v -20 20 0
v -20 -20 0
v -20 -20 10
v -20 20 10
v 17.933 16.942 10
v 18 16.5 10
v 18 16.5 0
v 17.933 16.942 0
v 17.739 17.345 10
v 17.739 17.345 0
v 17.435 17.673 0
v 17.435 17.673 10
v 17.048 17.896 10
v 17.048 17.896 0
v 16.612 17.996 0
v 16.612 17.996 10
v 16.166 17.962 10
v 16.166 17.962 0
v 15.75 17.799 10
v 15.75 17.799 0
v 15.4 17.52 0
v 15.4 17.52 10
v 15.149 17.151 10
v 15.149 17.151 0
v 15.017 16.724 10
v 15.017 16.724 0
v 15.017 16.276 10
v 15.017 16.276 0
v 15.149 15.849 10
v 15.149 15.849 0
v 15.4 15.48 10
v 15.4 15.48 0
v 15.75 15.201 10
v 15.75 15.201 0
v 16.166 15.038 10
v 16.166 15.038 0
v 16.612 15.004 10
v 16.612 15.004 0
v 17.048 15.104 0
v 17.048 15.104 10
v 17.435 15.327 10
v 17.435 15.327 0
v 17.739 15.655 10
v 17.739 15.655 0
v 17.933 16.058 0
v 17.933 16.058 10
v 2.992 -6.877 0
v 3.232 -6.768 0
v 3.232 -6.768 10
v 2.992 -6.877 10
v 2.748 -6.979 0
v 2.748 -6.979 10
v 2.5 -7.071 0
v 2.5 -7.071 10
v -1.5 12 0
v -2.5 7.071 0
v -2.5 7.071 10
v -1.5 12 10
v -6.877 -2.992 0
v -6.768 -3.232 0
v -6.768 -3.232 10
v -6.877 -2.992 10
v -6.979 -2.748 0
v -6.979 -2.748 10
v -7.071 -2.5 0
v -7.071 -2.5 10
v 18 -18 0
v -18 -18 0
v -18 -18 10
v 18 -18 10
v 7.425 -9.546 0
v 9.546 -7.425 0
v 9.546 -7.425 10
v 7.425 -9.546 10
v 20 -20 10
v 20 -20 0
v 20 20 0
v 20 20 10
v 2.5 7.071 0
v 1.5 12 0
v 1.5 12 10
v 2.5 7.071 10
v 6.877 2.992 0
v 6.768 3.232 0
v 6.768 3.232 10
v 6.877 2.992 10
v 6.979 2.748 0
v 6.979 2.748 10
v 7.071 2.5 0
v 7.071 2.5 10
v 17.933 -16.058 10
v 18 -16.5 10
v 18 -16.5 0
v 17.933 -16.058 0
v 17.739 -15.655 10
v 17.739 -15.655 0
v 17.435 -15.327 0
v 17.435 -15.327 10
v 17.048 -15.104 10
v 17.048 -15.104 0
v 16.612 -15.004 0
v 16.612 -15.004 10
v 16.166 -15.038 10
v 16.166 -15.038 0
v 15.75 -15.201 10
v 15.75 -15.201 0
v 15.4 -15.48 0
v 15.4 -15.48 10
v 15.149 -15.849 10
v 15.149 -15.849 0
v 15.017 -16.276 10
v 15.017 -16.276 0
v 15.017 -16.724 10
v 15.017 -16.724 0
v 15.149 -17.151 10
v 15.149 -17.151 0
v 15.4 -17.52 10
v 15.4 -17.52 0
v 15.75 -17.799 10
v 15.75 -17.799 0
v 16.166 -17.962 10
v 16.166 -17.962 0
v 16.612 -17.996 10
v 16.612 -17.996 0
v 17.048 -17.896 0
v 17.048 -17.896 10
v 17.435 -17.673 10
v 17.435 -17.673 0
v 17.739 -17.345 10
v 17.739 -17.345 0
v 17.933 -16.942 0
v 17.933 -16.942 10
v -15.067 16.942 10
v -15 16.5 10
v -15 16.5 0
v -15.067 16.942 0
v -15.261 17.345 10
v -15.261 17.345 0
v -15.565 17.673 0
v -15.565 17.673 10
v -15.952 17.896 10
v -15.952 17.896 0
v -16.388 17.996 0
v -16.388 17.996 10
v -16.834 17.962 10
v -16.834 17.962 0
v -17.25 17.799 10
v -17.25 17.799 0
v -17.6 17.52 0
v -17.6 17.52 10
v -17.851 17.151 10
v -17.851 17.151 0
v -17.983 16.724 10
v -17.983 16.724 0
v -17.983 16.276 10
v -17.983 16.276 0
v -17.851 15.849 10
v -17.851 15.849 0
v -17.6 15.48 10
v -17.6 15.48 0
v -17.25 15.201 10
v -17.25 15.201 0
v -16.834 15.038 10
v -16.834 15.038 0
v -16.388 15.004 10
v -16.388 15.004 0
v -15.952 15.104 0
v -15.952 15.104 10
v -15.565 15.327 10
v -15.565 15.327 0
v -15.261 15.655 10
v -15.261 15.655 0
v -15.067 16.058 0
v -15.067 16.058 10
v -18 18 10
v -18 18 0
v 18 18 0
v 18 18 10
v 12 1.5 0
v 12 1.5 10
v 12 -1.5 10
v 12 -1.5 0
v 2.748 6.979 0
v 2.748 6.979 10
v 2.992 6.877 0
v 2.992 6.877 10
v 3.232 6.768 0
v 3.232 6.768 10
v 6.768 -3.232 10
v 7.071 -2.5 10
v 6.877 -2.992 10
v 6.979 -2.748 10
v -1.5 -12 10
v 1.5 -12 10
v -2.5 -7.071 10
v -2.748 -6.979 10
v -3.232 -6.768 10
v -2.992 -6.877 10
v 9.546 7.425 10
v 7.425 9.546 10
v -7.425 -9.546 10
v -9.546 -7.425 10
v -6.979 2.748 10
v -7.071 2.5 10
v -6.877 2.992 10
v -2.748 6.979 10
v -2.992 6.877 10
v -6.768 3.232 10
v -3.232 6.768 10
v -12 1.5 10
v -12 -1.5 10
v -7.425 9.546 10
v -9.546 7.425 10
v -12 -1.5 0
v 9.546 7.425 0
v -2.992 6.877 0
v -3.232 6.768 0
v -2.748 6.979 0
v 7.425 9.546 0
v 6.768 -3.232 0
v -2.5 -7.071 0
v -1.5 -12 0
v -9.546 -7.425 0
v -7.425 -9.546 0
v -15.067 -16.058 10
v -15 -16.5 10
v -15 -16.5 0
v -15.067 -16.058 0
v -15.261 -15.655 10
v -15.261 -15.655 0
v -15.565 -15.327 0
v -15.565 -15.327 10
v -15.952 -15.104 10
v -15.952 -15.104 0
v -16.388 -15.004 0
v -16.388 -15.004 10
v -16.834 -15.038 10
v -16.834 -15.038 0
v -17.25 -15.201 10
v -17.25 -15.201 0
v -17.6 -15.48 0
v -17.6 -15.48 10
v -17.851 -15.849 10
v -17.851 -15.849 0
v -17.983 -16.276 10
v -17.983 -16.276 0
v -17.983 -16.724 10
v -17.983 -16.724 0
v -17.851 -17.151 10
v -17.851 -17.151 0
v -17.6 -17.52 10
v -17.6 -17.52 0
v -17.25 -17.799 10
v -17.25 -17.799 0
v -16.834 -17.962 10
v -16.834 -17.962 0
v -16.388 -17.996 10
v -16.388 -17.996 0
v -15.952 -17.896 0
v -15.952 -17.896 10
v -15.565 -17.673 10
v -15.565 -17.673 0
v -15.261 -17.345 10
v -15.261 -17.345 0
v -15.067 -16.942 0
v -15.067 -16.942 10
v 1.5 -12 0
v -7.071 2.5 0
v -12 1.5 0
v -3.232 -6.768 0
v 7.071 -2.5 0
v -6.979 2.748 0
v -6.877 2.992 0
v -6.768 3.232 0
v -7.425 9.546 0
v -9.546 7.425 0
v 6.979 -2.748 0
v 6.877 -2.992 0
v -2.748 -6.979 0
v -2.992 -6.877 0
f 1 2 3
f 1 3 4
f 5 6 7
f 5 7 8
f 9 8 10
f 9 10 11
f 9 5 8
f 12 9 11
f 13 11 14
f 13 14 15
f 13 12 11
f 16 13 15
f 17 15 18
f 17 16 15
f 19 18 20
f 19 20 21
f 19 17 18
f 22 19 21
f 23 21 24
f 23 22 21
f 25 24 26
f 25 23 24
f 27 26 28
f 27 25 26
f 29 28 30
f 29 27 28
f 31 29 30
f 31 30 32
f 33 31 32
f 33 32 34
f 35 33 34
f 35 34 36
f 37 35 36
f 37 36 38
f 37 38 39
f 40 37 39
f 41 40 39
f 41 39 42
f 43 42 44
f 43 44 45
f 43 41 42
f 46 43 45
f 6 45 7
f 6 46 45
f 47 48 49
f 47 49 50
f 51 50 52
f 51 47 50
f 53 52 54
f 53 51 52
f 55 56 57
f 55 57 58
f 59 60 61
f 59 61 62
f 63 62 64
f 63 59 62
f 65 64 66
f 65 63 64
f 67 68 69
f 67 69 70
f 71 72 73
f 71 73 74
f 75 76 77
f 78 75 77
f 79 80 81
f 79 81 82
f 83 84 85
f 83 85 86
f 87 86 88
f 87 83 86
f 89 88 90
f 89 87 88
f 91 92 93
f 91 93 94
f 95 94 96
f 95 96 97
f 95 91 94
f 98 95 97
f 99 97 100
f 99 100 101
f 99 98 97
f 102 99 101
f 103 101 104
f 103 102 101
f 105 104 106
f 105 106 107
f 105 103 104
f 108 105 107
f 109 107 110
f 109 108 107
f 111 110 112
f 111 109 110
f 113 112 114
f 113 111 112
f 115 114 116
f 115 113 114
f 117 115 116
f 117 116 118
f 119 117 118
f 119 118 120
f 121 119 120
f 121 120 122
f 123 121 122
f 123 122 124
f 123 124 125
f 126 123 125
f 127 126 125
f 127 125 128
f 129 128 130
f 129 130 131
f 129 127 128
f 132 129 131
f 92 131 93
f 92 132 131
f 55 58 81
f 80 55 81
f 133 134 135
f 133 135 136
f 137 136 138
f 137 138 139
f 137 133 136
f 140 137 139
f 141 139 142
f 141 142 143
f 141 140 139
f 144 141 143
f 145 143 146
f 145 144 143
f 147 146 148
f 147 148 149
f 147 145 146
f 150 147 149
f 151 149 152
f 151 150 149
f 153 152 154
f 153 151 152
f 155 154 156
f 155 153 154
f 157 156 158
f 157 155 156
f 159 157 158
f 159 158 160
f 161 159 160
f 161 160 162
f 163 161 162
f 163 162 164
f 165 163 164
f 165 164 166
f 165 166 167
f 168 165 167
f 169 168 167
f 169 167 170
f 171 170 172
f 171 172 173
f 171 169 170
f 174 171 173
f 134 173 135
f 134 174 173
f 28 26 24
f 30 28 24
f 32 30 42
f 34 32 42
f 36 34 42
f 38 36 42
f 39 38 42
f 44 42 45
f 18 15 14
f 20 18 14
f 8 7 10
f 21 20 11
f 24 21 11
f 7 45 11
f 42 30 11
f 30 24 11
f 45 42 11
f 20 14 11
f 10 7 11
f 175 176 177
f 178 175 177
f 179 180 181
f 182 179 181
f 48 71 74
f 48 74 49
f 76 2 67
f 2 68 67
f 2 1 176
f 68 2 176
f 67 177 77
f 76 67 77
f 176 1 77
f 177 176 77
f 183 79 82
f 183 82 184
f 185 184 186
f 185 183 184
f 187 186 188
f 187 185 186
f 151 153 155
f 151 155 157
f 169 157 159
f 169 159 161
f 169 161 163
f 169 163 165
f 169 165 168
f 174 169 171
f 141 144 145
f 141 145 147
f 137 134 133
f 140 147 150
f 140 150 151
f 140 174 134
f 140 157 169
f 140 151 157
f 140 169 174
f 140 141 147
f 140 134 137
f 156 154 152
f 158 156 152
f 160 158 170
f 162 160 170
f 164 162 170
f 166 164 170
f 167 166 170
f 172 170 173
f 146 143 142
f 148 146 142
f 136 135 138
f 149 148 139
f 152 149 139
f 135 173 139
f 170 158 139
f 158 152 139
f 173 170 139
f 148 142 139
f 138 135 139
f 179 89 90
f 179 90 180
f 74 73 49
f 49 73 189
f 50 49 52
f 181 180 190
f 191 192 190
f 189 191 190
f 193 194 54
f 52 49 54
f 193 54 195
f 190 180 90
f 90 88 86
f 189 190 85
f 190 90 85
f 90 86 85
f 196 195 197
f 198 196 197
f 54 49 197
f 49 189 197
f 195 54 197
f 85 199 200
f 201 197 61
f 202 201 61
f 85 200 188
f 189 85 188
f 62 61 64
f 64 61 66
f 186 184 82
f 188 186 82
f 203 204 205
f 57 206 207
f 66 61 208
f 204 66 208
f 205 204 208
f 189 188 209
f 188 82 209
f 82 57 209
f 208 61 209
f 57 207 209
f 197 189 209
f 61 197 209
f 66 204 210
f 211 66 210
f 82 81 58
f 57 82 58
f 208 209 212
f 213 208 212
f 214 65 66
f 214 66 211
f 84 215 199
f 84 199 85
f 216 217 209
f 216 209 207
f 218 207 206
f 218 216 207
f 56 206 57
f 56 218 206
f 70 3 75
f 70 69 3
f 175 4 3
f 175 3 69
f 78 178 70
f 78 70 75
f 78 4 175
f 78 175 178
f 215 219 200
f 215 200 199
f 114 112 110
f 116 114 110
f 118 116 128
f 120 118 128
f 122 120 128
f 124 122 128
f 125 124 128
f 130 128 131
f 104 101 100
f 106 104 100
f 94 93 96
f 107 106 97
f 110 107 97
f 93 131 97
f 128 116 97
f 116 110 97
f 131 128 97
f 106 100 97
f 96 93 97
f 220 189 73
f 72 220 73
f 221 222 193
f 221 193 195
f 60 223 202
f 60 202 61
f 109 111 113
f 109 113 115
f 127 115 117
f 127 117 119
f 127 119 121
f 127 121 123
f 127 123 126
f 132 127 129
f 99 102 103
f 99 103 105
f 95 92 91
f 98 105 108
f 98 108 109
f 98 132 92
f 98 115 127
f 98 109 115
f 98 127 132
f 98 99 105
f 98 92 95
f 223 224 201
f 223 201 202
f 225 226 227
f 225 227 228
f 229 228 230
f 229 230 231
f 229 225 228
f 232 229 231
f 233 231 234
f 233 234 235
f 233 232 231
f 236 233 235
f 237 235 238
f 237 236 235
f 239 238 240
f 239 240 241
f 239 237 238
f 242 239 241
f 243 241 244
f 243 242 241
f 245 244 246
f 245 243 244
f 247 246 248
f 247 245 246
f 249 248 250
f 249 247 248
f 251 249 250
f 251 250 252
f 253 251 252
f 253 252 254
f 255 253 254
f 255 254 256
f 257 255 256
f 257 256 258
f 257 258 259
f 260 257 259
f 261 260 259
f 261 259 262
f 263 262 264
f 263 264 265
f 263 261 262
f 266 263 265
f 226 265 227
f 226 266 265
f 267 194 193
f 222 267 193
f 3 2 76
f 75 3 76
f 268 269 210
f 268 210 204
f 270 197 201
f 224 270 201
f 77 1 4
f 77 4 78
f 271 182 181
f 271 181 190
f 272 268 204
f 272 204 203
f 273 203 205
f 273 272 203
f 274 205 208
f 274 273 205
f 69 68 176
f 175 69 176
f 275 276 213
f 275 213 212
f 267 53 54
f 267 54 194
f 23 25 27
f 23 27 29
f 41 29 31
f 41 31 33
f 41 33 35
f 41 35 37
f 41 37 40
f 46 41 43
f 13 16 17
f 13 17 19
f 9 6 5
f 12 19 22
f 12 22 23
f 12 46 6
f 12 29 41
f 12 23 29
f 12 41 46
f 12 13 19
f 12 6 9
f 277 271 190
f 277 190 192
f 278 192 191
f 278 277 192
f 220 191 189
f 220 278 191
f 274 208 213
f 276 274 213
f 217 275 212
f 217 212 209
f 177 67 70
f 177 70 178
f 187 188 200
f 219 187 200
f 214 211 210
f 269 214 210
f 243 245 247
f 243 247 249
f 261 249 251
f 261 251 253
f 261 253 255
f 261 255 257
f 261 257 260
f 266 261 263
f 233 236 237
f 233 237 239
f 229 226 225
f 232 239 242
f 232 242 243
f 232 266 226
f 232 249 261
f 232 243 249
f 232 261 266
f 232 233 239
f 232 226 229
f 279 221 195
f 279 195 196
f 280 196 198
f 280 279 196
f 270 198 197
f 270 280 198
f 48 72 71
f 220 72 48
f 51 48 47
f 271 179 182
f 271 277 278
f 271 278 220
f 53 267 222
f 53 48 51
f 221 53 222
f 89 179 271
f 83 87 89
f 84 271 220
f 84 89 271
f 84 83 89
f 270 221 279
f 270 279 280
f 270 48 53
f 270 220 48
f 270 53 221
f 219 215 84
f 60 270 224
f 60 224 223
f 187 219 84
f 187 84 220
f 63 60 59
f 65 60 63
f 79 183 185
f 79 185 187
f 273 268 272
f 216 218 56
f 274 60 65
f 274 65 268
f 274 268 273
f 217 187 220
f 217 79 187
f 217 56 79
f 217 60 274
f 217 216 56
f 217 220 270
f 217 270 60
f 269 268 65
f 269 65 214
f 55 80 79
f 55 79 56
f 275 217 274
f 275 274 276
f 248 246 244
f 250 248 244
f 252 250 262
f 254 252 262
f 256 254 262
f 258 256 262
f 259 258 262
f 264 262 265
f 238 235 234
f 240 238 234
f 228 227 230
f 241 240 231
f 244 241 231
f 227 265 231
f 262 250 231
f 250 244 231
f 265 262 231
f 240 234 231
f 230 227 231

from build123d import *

# Parameters (mm, degrees)
BOSS_EXTRUDE1_DEPTH   = 10
SKETCH1_W             = 40
SKETCH1_H             = 40
SKETCH1_W_2           = 36
SKETCH1_H_2           = 36
BOSS_EXTRUDE1_2_DEPTH = 10
SKETCH2_R             = 1.5
BOSS_EXTRUDE2_DEPTH   = 10
BOSS_EXTRUDE2_2_DEPTH = 10
BOSS_EXTRUDE2_3_DEPTH = 10
BOSS_EXTRUDE2_4_DEPTH = 10


with BuildPart() as part:
    # Sketch1 → Boss-Extrude1 (new body)
    with BuildSketch(Plane.XY):
        with BuildLine():
            Line((-2.5, 7.071067812), (-1.5, 12))
            Line((-1.5, 12), (1.5, 12))
            Line((1.5, 12), (2.5, 7.071067812))
            ThreePointArc((2.5, 7.071067812), (2.870125743, 6.929096494), (3.232233047, 6.767766953))
            Line((3.232233047, 6.767766953), (7.424621202, 9.545941546))
            Line((7.424621202, 9.545941546), (9.545941546, 7.424621202))
            Line((9.545941546, 7.424621202), (6.767766953, 3.232233047))
            ThreePointArc((6.767766953, 3.232233047), (6.929096494, 2.870125743), (7.071067812, 2.5))
            Line((7.071067812, 2.5), (12, 1.5))
            Line((12, 1.5), (12, -1.5))
            Line((12, -1.5), (7.071067812, -2.5))
            ThreePointArc((7.071067812, -2.5), (6.929096494, -2.870125743), (6.767766953, -3.232233047))
            Line((6.767766953, -3.232233047), (9.545941546, -7.424621202))
            Line((9.545941546, -7.424621202), (7.424621202, -9.545941546))
            Line((7.424621202, -9.545941546), (3.232233047, -6.767766953))
            ThreePointArc((3.232233047, -6.767766953), (2.870125743, -6.929096494), (2.5, -7.071067812))
            Line((2.5, -7.071067812), (1.5, -12))
            Line((1.5, -12), (-1.5, -12))
            Line((-1.5, -12), (-2.5, -7.071067812))
            ThreePointArc((-2.5, -7.071067812), (-2.870125743, -6.929096494), (-3.232233047, -6.767766953))
            Line((-3.232233047, -6.767766953), (-7.424621202, -9.545941546))
            Line((-7.424621202, -9.545941546), (-9.545941546, -7.424621202))
            Line((-9.545941546, -7.424621202), (-6.767766953, -3.232233047))
            ThreePointArc((-6.767766953, -3.232233047), (-6.929096494, -2.870125743), (-7.071067812, -2.5))
            Line((-7.071067812, -2.5), (-12, -1.5))
            Line((-12, -1.5), (-12, 1.5))
            Line((-12, 1.5), (-7.071067812, 2.5))
            ThreePointArc((-7.071067812, 2.5), (-6.929096494, 2.870125743), (-6.767766953, 3.232233047))
            Line((-6.767766953, 3.232233047), (-9.545941546, 7.424621202))
            Line((-9.545941546, 7.424621202), (-7.424621202, 9.545941546))
            Line((-7.424621202, 9.545941546), (-3.232233047, 6.767766953))
            ThreePointArc((-3.232233047, 6.767766953), (-2.870125743, 6.929096494), (-2.5, 7.071067812))
        make_face()
    extrude(amount=BOSS_EXTRUDE1_DEPTH)


with BuildPart() as body_2:
    # Sketch1 → Boss-Extrude1 2 (new body)
    with BuildSketch(Plane.XY):
        Rectangle(SKETCH1_W, SKETCH1_H)
        Rectangle(SKETCH1_W_2, SKETCH1_H_2, mode=Mode.SUBTRACT)
    extrude(amount=BOSS_EXTRUDE1_2_DEPTH)


with BuildPart() as body_3:
    # Sketch2 → Boss-Extrude2 (new body)
    with BuildSketch(Plane.XY.offset(10)):
        with Locations((-16.5, 16.5)):
            Circle(SKETCH2_R)
    extrude(amount=-BOSS_EXTRUDE2_DEPTH)


with BuildPart() as body_4:
    # Sketch2 → Boss-Extrude2 2 (new body)
    with BuildSketch(Plane.XY.offset(10)):
        with Locations((16.5, 16.5)):
            Circle(SKETCH2_R)
    extrude(amount=-BOSS_EXTRUDE2_2_DEPTH)


with BuildPart() as body_5:
    # Sketch2 → Boss-Extrude2 3 (new body)
    with BuildSketch(Plane.XY.offset(10)):
        with Locations((16.5, -16.5)):
            Circle(SKETCH2_R)
    extrude(amount=-BOSS_EXTRUDE2_3_DEPTH)


with BuildPart() as body_6:
    # Sketch2 → Boss-Extrude2 4 (new body)
    with BuildSketch(Plane.XY.offset(10)):
        with Locations((-16.5, -16.5)):
            Circle(SKETCH2_R)
    extrude(amount=-BOSS_EXTRUDE2_4_DEPTH)


solid = Compound([part.part, body_2.part, body_3.part, body_4.part, body_5.part, body_6.part])
